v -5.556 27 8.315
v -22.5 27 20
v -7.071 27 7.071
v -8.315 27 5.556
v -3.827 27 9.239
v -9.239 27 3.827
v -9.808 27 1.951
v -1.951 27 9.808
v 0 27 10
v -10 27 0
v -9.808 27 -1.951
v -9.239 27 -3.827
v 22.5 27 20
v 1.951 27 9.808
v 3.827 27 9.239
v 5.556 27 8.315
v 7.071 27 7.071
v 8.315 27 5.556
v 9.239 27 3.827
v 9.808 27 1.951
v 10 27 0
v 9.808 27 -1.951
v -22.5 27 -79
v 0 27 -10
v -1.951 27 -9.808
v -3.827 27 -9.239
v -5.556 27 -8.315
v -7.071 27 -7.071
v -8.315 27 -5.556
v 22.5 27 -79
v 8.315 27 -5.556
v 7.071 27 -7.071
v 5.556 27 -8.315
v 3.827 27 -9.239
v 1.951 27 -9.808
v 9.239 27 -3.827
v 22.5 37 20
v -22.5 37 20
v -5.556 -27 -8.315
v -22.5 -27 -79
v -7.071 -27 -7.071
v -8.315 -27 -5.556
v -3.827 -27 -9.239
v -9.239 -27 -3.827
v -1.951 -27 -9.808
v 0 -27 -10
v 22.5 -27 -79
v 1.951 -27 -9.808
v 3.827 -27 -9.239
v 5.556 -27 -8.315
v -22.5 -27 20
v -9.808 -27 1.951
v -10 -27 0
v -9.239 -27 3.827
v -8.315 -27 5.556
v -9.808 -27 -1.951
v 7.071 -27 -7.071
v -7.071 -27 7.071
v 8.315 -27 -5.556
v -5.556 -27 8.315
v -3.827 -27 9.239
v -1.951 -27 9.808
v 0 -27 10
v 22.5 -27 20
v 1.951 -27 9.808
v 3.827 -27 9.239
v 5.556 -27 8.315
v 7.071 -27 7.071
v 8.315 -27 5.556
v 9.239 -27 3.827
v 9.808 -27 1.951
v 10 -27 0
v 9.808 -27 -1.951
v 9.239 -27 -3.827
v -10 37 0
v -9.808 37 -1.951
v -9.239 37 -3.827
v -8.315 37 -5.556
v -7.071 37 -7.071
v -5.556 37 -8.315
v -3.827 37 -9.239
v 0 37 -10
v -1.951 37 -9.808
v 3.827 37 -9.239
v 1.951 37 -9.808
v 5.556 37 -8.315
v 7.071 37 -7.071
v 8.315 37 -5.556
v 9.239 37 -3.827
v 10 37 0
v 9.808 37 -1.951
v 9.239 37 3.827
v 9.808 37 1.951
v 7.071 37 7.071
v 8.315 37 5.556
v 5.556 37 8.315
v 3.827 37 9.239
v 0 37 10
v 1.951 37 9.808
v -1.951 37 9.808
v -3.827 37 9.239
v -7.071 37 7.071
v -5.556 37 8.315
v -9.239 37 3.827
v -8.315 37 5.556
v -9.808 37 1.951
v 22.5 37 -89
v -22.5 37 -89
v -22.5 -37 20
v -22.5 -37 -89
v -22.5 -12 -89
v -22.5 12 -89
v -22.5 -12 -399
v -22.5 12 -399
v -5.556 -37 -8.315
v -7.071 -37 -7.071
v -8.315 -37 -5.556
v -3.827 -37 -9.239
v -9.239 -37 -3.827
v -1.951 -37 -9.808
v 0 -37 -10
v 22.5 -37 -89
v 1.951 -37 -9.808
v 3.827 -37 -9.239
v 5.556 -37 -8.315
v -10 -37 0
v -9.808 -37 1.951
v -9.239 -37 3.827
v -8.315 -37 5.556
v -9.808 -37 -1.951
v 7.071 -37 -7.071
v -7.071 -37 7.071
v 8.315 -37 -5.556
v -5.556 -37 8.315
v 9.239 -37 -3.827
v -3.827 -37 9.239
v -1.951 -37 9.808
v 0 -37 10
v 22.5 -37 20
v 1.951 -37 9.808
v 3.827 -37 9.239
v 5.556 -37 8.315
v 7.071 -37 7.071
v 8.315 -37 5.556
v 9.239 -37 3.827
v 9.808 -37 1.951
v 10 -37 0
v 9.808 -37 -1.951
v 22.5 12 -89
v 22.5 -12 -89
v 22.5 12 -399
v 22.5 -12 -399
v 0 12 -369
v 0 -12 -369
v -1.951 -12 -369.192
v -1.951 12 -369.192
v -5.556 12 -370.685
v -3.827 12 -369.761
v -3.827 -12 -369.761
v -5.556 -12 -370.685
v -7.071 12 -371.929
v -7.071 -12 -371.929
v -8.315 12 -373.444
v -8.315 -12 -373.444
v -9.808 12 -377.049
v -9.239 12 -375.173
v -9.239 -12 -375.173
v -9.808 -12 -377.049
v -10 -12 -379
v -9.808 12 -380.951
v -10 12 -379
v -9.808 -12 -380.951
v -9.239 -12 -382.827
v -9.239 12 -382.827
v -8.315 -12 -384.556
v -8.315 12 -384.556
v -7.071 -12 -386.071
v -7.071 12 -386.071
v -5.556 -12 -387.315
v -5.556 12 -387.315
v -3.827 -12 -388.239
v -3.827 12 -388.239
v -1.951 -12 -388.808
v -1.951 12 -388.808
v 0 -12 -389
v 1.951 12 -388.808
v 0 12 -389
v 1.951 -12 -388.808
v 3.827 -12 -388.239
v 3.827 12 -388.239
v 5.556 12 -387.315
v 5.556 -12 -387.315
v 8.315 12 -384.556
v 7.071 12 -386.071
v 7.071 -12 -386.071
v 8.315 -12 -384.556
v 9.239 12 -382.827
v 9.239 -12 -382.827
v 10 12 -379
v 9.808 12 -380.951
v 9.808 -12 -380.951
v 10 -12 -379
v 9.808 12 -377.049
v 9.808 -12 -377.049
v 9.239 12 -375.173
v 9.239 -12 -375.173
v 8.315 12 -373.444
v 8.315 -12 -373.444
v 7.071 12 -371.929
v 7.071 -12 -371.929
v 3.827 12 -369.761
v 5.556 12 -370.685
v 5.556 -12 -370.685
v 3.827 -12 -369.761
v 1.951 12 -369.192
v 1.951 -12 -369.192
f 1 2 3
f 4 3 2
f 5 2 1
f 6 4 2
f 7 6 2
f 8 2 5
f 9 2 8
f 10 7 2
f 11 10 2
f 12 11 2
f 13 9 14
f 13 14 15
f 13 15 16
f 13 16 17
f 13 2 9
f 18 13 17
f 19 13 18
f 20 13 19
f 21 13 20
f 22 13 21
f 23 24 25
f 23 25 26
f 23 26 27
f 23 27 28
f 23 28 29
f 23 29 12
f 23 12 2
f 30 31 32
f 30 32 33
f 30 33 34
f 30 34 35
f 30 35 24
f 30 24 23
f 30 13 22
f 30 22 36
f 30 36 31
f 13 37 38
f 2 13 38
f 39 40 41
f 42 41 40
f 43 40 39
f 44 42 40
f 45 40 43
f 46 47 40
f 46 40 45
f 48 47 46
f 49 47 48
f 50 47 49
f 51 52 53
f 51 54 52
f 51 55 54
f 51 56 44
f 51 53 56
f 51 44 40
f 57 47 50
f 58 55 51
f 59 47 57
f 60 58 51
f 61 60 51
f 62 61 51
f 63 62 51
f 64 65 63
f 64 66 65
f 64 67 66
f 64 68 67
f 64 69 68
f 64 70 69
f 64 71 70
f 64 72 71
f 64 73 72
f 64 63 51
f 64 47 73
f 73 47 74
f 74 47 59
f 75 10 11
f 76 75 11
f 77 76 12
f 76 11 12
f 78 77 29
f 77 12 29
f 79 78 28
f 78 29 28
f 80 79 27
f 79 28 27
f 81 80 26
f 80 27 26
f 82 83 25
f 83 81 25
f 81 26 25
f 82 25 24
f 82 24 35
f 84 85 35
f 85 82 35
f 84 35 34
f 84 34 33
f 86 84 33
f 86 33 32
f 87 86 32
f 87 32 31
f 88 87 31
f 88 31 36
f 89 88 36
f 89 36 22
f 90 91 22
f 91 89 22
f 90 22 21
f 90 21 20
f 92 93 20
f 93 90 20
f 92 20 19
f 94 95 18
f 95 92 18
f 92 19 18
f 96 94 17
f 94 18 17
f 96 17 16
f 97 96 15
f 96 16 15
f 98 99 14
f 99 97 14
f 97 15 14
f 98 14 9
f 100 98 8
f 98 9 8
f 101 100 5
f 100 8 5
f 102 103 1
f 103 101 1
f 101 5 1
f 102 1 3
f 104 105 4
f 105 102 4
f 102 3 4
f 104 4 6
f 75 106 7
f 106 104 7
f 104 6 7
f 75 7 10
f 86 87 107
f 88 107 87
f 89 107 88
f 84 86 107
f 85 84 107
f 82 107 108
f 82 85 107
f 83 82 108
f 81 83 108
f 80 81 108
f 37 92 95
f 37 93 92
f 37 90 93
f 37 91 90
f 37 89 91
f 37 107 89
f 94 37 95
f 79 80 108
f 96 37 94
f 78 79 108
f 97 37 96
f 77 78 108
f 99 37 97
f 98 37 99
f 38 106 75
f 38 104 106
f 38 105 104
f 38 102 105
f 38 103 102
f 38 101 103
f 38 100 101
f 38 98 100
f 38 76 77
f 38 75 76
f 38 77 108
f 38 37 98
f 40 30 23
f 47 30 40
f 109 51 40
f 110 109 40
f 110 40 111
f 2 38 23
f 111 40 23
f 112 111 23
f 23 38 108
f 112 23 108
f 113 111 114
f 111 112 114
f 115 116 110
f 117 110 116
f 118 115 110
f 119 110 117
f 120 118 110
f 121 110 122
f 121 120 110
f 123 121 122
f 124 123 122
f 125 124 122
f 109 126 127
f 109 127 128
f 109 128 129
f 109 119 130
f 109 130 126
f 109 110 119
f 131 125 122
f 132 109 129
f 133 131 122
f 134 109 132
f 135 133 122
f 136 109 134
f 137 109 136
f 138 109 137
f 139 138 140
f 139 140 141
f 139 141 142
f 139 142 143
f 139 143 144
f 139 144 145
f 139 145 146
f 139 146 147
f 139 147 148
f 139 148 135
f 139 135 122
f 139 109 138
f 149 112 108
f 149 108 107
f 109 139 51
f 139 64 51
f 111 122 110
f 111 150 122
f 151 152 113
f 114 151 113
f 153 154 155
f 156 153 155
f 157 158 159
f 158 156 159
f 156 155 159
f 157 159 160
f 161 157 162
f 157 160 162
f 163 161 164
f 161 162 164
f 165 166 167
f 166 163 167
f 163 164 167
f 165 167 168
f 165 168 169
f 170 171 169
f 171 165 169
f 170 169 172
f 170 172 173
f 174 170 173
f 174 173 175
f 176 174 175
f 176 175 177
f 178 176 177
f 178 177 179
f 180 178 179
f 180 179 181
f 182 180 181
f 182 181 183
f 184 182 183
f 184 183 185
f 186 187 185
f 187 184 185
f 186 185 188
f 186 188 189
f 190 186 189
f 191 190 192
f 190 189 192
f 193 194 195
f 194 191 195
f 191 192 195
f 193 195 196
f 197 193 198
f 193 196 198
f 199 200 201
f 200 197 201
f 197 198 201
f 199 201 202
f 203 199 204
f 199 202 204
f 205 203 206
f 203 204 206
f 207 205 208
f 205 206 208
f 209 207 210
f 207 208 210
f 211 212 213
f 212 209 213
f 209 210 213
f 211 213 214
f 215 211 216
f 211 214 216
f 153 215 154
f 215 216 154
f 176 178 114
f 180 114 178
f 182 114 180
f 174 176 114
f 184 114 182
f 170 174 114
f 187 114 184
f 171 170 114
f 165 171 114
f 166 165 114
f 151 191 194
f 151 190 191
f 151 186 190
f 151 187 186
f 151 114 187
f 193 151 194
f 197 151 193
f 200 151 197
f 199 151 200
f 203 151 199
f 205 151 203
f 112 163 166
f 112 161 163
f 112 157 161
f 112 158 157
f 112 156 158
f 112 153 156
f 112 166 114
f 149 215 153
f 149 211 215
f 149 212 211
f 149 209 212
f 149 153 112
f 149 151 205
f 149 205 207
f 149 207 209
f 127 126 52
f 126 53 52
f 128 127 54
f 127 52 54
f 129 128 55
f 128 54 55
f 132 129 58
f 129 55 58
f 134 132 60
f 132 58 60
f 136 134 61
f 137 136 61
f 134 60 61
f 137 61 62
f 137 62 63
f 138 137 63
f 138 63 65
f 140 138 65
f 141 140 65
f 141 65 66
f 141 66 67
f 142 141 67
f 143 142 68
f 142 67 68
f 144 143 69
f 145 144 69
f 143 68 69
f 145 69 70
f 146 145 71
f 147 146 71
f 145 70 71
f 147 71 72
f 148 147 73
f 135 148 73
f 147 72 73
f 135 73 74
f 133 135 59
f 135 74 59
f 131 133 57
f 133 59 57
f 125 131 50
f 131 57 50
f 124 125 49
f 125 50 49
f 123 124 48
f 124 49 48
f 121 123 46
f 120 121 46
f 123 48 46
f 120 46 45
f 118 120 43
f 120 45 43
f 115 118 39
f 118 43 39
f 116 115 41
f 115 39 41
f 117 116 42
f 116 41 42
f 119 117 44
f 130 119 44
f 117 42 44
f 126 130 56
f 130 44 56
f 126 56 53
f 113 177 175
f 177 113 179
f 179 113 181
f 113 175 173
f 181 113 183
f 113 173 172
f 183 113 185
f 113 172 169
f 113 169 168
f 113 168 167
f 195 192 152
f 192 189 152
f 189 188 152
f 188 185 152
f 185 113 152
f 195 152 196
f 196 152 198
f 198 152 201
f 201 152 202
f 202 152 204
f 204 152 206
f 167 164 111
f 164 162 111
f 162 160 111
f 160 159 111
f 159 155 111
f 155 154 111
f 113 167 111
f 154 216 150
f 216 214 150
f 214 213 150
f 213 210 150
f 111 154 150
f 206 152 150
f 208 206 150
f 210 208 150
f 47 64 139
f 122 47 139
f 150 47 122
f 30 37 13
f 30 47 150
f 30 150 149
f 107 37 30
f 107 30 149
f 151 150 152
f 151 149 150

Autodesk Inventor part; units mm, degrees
ref_plane "YZ Plane" through (0, 0, 0) normal (1, 0, 0) x (0, 1, 0)
ref_plane "XZ Plane" through (0, 0, 0) normal (0, 1, 0) x (-1, 0, 0)
ref_plane "XY Plane" through (0, 0, 0) normal (0, 0, 1) x (1, 0, 0)
sketch "Sketch1" plane through (0, 0, 0) normal (1, 0, 0) x (0, 1, 0)
  circle A0 centre (0, 0) radius 10
  circle A1 centre (-379, 0) radius 10
  line L0 (0, 0) -> (-379, 0) construction
  line L1 (20, 22.5) -> (-399, 22.5)
  line L2 (-399, 22.5) -> (-399, -22.5)
  line L3 (-399, -22.5) -> (20, -22.5)
  line L4 (20, -22.5) -> (20, 22.5)
  line L5 (20, 0) -> (-399, 0) construction
  dimension "d0" = 20
  dimension "d2" = 20
  dimension "d3" = 379
  dimension "d4" = 45
  dimension "d5" = 20
extrude "Extrusion1" add sketch "Sketch1" along normal mid plane 24
sketch "Sketch2" plane through (12, 0, 0) normal (1, 0, 0) x (0, 0, -1)
  circle A0 centre (0, 0) radius 10 projected
  line L0 (22.5, -399) -> (22.5, 20) projected
  line L1 (22.5, 20) -> (-22.5, 20) projected
  line L2 (-22.5, 20) -> (22.5, 20)
  line L3 (22.5, 20) -> (22.5, -89)
  line L4 (22.5, -89) -> (-22.5, -89)
  line L5 (-22.5, -89) -> (-22.5, 20)
  circle A1 centre (0, 0) radius 10
  dimension "d8" = 109
extrude "Extrusion2" add sketch "Sketch2" along normal blind 25
mirror "Mirror1" about plane through (0, 0, 0) normal (1, 0, 0) of "Extrusion2"
sketch "Sketch3" plane through (-12, -399, 22.5) normal (0, 0, 1) x (1, 0, 0)
  line L0 (49, 419) -> (-25, 419) projected
  line L1 (-15, 419) -> (39, 419)
  line L2 (39, 419) -> (39, 320)
  line L3 (39, 320) -> (-15, 320)
  line L4 (-15, 320) -> (-15, 419)
  line L5 (12, 419) -> (12, 320) construction
  point P0 (12, 399)
  dimension "d11" = 99
  dimension "d13" = 54
extrude "Extrusion3" cut sketch "Sketch3" against normal through all
move or copy body "Move Body1" bodies to move or copy 1 copy no rotation origin (0, 0, 0) rotation axis (1, 0, 0) rotation angle 90
move or copy body "Move Body2" bodies to move or copy 1 copy no rotation origin (0, 0, 0) rotation axis (0, 0, 1) rotation angle 90
properties part number "UpperLeg_v2"
